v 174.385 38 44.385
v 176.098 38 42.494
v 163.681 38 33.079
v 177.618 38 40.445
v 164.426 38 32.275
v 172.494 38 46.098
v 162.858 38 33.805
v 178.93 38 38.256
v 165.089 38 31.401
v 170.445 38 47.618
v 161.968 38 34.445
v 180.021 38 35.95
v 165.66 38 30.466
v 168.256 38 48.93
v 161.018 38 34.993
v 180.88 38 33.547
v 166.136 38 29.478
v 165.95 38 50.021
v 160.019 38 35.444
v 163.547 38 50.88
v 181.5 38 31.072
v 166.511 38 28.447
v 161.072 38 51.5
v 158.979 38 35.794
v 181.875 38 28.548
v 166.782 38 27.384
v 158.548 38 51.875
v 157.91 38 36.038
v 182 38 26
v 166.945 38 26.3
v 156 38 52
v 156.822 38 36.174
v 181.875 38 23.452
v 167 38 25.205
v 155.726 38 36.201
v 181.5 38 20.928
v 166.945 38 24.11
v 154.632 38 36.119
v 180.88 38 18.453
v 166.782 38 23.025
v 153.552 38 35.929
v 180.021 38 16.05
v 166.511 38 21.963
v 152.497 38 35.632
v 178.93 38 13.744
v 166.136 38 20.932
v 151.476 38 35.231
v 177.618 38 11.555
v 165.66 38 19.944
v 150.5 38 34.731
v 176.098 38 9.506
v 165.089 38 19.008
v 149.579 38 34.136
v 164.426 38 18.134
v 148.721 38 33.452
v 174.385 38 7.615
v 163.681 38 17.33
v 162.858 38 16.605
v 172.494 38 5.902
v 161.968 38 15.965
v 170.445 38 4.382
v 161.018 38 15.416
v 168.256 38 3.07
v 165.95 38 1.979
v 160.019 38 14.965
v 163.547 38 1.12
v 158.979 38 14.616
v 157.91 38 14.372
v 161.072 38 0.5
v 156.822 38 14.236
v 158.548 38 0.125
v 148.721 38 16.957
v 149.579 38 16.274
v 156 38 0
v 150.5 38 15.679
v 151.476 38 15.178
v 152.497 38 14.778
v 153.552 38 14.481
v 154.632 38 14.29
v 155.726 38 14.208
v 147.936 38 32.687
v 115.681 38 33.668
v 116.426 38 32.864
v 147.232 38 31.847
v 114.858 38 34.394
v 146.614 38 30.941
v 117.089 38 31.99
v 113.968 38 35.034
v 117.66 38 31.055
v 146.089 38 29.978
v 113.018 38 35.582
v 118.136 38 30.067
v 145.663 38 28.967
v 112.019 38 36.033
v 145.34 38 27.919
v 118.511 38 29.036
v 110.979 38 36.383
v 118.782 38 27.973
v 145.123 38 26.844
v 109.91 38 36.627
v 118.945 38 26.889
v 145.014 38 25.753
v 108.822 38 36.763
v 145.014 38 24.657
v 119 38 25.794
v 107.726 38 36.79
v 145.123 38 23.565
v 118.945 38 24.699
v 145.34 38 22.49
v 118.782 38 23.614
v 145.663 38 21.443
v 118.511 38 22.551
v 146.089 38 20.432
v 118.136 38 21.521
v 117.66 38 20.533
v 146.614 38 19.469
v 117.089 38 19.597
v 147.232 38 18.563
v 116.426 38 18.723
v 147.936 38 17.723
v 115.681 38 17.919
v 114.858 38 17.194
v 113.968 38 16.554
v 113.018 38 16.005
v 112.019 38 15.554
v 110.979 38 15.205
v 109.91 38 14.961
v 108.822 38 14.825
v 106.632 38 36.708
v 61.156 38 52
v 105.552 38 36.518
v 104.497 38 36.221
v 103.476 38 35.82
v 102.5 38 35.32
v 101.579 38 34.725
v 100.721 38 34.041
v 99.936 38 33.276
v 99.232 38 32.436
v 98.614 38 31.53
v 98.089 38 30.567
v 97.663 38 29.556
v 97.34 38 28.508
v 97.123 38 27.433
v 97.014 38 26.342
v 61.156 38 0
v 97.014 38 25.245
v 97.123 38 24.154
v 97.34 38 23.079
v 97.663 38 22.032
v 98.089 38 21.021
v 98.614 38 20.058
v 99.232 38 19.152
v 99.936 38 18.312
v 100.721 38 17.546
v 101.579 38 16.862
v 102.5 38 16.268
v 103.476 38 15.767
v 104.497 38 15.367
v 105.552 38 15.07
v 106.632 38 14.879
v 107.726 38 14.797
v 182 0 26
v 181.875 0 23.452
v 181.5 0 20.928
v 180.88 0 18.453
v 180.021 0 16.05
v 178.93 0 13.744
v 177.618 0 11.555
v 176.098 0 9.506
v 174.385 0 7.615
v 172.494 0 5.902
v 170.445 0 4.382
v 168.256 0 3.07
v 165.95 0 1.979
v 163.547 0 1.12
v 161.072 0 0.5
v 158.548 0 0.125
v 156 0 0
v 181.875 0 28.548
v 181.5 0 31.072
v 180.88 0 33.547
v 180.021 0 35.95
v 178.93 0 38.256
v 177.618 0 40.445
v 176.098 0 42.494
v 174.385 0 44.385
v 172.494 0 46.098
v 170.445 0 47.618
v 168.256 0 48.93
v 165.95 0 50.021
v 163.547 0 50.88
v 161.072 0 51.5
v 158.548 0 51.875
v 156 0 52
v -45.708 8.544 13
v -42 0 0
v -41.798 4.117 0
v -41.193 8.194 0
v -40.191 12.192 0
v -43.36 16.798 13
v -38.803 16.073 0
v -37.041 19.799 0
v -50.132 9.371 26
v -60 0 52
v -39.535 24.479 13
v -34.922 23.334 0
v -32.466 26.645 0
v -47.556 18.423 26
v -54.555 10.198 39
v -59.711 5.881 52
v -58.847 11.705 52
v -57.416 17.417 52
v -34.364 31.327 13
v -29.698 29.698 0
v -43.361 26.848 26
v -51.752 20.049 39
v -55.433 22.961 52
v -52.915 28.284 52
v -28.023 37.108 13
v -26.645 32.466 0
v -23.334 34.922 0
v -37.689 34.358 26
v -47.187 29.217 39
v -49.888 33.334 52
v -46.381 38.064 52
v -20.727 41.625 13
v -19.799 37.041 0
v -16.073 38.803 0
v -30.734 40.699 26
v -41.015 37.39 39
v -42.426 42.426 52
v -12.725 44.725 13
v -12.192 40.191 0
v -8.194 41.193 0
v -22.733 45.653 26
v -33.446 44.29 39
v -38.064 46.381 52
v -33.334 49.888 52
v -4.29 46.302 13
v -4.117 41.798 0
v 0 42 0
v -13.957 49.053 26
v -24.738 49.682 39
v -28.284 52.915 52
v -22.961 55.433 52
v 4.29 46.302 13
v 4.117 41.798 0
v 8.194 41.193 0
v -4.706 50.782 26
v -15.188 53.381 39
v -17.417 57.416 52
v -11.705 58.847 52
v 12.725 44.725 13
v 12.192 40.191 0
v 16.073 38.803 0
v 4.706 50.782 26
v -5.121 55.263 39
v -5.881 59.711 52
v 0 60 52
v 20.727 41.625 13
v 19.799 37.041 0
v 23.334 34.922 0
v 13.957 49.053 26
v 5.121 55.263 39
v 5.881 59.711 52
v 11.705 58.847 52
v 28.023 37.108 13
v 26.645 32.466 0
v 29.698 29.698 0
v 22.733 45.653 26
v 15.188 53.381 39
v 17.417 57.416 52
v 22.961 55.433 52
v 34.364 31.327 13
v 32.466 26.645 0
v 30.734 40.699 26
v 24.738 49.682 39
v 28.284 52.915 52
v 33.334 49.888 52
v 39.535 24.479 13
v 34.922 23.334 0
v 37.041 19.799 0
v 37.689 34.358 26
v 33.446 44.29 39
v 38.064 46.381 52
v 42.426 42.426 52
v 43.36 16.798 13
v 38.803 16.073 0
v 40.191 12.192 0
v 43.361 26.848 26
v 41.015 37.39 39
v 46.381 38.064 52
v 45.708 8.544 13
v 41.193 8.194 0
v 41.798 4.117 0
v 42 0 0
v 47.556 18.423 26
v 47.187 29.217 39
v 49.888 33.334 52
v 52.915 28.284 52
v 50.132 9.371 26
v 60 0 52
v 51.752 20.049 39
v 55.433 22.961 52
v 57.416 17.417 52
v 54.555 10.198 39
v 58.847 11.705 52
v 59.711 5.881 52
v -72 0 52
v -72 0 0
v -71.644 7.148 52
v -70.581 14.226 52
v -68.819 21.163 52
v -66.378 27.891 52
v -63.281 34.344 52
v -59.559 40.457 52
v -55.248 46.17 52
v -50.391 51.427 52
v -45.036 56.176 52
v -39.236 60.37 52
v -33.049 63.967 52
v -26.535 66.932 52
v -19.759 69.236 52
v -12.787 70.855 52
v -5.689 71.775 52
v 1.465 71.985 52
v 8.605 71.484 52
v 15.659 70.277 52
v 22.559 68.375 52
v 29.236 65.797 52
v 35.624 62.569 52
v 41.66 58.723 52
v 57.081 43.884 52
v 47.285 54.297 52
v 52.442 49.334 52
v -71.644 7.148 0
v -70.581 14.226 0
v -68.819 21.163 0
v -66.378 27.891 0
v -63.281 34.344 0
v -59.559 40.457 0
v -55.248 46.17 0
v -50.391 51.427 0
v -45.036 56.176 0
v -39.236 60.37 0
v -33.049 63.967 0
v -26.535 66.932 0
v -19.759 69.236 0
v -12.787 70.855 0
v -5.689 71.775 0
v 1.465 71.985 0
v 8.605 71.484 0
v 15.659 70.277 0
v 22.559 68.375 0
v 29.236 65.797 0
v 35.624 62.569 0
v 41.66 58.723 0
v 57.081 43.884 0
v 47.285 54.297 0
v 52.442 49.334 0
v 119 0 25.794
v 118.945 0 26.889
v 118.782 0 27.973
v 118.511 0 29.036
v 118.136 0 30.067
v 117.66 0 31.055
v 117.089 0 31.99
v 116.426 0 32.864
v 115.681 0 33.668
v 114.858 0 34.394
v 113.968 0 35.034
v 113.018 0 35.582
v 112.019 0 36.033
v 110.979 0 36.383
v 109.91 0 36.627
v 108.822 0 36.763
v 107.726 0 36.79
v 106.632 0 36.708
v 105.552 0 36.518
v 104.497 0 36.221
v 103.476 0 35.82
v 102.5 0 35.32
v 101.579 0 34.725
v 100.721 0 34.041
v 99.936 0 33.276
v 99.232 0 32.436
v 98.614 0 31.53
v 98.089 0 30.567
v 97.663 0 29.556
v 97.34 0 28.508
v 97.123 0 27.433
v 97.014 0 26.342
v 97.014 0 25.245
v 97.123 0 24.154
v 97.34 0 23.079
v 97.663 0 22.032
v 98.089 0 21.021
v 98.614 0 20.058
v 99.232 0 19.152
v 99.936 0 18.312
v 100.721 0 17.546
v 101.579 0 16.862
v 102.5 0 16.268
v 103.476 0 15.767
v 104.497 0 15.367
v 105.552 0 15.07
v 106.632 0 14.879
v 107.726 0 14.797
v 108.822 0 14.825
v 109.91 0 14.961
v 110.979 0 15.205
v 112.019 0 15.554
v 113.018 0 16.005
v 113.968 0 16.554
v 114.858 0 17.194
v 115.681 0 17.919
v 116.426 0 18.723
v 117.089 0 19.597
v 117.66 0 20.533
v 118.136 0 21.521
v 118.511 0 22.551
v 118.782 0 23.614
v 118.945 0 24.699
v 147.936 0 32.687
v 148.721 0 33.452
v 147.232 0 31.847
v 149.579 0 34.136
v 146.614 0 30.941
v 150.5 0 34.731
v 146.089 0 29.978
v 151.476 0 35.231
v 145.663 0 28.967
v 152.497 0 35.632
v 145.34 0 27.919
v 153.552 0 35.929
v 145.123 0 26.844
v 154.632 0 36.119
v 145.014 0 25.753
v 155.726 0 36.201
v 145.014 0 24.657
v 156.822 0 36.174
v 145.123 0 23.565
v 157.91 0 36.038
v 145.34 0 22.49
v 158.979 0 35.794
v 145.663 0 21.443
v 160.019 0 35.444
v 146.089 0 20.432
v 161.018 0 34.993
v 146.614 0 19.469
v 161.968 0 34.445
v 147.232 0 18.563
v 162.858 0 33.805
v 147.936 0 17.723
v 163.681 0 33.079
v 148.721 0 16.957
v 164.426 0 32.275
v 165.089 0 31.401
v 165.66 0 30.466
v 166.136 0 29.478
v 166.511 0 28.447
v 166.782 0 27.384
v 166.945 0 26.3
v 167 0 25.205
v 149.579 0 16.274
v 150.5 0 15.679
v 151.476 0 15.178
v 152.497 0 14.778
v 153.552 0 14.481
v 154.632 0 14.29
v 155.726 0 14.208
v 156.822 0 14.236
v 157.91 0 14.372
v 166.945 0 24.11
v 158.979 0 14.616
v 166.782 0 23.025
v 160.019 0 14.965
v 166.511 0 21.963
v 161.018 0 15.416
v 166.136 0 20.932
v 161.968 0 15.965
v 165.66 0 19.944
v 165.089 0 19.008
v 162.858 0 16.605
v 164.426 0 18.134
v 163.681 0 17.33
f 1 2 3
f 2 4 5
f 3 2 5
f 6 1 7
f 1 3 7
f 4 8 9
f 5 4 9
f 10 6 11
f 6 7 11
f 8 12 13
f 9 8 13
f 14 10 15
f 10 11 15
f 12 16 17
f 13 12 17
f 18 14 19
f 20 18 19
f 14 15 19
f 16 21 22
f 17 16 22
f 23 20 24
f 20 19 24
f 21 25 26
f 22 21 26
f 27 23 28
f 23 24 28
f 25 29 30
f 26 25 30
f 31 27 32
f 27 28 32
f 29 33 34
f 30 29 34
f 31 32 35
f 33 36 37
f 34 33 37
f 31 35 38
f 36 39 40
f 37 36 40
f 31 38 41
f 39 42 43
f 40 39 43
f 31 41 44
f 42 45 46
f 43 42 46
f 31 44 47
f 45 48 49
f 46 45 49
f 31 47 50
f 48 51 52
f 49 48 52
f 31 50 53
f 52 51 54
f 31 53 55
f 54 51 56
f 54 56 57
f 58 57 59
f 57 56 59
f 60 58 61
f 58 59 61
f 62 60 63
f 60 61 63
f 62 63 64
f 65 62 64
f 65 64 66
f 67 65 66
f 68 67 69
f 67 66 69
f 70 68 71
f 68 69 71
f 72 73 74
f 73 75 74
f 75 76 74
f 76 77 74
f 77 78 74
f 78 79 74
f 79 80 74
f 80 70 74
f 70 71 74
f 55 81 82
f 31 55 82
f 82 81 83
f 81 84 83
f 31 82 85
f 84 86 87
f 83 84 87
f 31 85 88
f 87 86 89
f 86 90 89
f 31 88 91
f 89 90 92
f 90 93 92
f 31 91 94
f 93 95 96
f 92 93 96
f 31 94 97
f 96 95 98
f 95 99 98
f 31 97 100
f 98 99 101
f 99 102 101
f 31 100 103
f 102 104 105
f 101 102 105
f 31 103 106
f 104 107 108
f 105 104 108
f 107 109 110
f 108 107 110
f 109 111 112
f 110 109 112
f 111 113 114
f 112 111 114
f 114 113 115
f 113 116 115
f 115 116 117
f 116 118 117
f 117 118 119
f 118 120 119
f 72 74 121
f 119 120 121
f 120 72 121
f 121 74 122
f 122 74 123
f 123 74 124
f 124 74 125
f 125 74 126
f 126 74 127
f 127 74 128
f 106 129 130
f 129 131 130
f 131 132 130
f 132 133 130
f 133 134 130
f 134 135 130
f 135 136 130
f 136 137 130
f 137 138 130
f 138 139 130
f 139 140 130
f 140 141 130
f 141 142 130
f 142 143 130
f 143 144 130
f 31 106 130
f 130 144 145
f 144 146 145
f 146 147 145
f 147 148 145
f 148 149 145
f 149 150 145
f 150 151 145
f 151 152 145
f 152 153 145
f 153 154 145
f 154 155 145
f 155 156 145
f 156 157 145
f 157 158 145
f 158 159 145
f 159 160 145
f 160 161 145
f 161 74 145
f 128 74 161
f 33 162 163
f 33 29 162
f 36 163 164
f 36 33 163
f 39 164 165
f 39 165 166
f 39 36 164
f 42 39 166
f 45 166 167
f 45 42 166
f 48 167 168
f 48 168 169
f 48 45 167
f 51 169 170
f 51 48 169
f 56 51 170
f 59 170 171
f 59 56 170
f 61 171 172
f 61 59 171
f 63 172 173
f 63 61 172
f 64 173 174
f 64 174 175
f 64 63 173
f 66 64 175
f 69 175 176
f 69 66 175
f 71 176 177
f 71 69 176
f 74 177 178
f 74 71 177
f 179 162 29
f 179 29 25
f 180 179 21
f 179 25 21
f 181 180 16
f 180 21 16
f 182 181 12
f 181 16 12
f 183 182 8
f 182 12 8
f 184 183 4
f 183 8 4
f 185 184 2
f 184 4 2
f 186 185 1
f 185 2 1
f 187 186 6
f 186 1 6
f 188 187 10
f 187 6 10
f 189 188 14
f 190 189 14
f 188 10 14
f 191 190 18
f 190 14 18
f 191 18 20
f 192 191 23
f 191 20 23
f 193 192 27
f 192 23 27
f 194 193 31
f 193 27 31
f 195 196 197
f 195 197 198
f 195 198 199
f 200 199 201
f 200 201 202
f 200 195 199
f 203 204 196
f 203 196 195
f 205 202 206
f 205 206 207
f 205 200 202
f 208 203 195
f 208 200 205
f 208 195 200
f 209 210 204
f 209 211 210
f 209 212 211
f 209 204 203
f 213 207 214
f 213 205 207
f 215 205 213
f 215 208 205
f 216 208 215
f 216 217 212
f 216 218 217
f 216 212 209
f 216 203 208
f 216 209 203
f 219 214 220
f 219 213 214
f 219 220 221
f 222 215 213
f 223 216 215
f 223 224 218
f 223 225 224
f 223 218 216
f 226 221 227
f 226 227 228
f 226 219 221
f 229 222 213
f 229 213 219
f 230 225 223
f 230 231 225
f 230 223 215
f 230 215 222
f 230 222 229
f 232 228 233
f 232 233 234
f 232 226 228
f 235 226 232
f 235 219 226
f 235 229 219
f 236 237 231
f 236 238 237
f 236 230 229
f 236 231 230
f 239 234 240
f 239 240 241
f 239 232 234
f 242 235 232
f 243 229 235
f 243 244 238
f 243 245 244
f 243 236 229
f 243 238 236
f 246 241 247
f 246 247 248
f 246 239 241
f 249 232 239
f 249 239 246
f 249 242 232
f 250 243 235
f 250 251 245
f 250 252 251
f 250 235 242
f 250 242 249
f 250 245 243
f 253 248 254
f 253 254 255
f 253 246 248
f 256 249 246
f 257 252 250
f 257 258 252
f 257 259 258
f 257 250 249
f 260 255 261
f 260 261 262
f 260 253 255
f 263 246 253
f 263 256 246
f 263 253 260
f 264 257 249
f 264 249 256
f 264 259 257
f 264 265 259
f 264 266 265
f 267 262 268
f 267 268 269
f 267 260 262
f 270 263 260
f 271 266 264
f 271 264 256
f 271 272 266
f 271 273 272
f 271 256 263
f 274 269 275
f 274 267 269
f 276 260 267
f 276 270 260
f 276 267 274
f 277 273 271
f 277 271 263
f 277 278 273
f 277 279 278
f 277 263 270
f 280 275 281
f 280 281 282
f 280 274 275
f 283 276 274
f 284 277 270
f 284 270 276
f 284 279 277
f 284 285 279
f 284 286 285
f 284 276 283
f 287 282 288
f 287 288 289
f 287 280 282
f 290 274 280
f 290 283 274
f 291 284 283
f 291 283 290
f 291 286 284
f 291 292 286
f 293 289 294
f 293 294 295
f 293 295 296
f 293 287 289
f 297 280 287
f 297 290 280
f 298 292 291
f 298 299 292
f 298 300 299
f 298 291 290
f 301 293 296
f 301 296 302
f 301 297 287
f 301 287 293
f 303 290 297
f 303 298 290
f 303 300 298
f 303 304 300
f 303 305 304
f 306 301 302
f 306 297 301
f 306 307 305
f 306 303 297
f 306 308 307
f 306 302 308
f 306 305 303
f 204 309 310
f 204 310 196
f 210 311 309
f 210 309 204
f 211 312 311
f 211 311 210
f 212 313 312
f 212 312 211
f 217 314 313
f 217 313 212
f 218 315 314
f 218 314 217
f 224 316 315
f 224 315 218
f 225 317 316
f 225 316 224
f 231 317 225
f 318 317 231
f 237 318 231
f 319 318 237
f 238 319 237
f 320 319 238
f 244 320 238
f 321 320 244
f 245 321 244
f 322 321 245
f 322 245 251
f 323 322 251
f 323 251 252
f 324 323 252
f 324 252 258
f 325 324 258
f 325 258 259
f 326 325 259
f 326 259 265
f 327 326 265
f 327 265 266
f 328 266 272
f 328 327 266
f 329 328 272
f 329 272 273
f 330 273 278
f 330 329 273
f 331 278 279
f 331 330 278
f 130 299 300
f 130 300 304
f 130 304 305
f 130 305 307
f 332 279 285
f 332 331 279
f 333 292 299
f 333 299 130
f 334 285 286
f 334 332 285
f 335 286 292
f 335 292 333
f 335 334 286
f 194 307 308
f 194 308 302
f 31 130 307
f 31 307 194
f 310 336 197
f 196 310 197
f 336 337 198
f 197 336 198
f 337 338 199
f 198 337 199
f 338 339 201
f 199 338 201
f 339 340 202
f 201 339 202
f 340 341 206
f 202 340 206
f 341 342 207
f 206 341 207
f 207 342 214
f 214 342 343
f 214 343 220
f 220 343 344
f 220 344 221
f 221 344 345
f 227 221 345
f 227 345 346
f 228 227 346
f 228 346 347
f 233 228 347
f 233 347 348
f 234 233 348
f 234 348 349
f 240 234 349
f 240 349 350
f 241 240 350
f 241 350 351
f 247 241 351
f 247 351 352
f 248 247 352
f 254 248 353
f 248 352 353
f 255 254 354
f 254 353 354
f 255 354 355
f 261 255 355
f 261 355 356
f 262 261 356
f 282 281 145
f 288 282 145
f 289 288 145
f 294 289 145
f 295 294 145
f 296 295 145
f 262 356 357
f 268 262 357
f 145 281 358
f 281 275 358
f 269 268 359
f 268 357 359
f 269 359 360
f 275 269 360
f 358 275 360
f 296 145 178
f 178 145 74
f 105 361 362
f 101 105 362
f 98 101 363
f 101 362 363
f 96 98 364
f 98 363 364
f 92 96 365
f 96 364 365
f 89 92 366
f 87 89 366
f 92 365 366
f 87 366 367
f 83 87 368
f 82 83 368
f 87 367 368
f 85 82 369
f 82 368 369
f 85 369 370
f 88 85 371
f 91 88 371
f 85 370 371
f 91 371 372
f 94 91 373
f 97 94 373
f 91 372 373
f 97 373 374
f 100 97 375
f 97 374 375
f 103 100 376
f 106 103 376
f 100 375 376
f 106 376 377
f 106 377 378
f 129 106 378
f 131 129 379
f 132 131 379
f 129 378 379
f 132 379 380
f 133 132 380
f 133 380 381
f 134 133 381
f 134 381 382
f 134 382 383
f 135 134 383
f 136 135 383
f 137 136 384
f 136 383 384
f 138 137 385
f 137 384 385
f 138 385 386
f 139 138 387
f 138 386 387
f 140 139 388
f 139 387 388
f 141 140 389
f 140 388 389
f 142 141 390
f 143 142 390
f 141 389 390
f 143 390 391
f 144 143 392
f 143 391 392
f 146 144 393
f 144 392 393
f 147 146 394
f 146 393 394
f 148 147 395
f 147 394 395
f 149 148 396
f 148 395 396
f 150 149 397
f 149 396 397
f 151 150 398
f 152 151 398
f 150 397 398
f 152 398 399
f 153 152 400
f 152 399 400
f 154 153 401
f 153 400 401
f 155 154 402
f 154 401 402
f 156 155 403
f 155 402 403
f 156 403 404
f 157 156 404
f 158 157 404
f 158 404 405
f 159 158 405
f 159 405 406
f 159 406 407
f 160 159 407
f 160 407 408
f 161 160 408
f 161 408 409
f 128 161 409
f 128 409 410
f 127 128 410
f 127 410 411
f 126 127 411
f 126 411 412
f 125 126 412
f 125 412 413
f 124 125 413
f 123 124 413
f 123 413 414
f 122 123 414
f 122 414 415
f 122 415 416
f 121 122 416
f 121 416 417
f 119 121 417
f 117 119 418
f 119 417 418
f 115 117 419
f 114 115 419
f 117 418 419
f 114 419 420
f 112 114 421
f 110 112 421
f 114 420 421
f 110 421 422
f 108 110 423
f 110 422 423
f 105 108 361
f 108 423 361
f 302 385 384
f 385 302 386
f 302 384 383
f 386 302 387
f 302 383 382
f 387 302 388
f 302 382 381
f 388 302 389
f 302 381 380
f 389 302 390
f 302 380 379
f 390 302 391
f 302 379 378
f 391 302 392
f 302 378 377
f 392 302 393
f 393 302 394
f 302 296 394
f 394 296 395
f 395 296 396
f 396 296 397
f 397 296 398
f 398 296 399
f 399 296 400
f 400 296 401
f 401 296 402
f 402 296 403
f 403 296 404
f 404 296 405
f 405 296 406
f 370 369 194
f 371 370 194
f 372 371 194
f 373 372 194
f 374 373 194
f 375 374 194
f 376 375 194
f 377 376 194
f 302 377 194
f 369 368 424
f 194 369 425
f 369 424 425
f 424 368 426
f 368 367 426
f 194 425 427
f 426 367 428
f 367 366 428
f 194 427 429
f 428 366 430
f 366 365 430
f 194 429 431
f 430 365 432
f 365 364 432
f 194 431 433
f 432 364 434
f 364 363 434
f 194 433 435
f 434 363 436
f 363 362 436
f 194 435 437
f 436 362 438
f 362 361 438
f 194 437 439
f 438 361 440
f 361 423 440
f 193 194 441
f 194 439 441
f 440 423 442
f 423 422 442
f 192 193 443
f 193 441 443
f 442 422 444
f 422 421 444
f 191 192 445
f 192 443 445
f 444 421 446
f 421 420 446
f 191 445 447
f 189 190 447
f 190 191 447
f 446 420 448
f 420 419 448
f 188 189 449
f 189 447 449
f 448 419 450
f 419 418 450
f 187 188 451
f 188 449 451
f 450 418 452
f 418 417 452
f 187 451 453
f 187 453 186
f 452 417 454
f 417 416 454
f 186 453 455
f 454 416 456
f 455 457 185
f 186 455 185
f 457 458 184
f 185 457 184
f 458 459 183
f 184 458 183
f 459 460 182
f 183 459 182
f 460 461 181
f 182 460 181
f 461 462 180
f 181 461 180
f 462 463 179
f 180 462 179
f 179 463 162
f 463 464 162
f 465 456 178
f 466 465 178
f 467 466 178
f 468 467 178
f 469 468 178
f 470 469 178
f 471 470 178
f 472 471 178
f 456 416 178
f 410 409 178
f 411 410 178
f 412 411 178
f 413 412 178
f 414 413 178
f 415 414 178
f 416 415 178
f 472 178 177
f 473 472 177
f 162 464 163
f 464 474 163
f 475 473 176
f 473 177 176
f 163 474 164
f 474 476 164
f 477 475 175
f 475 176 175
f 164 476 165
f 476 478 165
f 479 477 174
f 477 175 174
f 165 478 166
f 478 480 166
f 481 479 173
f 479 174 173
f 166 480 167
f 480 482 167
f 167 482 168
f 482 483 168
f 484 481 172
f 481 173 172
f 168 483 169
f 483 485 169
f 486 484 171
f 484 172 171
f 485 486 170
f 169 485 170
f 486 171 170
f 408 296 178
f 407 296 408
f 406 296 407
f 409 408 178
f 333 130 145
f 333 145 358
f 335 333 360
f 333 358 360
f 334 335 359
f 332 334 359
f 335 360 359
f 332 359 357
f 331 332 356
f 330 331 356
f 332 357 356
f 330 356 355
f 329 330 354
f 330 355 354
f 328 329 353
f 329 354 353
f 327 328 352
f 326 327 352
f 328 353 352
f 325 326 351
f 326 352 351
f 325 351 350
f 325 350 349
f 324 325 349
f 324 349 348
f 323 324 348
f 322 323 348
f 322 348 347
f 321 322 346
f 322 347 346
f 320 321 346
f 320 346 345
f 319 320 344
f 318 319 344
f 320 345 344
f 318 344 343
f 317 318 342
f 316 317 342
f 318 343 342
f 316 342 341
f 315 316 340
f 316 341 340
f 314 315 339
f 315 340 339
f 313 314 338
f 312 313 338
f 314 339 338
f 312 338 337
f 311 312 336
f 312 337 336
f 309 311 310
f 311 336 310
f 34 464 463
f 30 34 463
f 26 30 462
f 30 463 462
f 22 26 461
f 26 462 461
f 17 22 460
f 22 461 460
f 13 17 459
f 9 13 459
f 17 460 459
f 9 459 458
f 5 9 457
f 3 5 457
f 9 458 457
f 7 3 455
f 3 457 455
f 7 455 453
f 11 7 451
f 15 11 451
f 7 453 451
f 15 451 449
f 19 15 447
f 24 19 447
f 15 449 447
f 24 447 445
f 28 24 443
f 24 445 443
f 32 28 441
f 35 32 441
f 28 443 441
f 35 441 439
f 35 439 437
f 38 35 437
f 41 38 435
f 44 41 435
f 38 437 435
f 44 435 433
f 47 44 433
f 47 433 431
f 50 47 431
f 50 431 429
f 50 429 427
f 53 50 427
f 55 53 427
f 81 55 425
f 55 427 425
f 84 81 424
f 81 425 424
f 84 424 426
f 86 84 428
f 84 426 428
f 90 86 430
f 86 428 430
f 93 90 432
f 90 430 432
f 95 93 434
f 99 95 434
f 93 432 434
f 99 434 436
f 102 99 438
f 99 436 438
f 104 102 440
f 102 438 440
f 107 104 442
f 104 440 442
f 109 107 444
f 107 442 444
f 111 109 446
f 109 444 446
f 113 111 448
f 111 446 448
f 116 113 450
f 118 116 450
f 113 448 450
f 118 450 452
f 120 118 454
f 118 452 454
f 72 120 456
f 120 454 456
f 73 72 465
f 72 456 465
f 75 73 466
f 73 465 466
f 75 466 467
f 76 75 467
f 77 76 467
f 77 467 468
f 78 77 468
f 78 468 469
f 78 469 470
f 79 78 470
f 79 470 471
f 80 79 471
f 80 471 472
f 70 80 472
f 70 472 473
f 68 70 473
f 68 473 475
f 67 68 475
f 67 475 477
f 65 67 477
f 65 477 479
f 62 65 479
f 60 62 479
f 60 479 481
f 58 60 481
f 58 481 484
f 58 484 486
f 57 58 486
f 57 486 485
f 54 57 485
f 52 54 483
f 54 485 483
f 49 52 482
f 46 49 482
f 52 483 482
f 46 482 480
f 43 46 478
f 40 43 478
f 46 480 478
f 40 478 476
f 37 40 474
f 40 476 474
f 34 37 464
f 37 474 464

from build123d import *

# Parameters (mm, degrees)
F1_DEPTH = 52
F4_R     = 11
F5_DEPTH = 38
F6_R     = 25.99999


# Not quite as in the source:
# - a fillet or chamfer is up to 0.001 mm smaller than in the source, because OpenCascade refuses the exact size


with BuildPart() as f1:
    # F0 (on Top) → F1 (new body)
    with BuildSketch(Plane.XY):
        with BuildLine():
            Line((182, 38), (61.1555394057, 38))
            ThreePointArc((61.1555394057, 38), (-19.7585571689, 69.2358246763), (-72, 0))
            Line((-72, 0), (182, 0))
            Line((182, 0), (182, 38))
        make_face()
    extrude(amount=F1_DEPTH)

    # F2 (on face) → F3 (revolve, cut)
    with BuildSketch(Plane.XZ):
        Polygon((60, 52), (0, 52), (0, 0), (42, 0), align=None)
    revolve(axis=Axis((0, 0, 26), (0, 0, -1)), mode=Mode.SUBTRACT)

    # F4 (on face) → F5 (cut)
    with BuildSketch(Plane.XZ):
        with Locations((108, 25.7937852293)):
            Circle(F4_R)
        with Locations((156, 25.2048280338)):
            Circle(F4_R)
    extrude(amount=-F5_DEPTH, mode=Mode.SUBTRACT)

    # F6 (radius 26 in the source; OpenCascade refuses exactly that, so slightly less here)
    f6_edges = [f1.edges().sort_by_distance(p)[0] for p in [
        (182, 19, 52),
        (182, 19, 0),
    ]]
    fillet(f6_edges, radius=F6_R)


solid = f1.part
